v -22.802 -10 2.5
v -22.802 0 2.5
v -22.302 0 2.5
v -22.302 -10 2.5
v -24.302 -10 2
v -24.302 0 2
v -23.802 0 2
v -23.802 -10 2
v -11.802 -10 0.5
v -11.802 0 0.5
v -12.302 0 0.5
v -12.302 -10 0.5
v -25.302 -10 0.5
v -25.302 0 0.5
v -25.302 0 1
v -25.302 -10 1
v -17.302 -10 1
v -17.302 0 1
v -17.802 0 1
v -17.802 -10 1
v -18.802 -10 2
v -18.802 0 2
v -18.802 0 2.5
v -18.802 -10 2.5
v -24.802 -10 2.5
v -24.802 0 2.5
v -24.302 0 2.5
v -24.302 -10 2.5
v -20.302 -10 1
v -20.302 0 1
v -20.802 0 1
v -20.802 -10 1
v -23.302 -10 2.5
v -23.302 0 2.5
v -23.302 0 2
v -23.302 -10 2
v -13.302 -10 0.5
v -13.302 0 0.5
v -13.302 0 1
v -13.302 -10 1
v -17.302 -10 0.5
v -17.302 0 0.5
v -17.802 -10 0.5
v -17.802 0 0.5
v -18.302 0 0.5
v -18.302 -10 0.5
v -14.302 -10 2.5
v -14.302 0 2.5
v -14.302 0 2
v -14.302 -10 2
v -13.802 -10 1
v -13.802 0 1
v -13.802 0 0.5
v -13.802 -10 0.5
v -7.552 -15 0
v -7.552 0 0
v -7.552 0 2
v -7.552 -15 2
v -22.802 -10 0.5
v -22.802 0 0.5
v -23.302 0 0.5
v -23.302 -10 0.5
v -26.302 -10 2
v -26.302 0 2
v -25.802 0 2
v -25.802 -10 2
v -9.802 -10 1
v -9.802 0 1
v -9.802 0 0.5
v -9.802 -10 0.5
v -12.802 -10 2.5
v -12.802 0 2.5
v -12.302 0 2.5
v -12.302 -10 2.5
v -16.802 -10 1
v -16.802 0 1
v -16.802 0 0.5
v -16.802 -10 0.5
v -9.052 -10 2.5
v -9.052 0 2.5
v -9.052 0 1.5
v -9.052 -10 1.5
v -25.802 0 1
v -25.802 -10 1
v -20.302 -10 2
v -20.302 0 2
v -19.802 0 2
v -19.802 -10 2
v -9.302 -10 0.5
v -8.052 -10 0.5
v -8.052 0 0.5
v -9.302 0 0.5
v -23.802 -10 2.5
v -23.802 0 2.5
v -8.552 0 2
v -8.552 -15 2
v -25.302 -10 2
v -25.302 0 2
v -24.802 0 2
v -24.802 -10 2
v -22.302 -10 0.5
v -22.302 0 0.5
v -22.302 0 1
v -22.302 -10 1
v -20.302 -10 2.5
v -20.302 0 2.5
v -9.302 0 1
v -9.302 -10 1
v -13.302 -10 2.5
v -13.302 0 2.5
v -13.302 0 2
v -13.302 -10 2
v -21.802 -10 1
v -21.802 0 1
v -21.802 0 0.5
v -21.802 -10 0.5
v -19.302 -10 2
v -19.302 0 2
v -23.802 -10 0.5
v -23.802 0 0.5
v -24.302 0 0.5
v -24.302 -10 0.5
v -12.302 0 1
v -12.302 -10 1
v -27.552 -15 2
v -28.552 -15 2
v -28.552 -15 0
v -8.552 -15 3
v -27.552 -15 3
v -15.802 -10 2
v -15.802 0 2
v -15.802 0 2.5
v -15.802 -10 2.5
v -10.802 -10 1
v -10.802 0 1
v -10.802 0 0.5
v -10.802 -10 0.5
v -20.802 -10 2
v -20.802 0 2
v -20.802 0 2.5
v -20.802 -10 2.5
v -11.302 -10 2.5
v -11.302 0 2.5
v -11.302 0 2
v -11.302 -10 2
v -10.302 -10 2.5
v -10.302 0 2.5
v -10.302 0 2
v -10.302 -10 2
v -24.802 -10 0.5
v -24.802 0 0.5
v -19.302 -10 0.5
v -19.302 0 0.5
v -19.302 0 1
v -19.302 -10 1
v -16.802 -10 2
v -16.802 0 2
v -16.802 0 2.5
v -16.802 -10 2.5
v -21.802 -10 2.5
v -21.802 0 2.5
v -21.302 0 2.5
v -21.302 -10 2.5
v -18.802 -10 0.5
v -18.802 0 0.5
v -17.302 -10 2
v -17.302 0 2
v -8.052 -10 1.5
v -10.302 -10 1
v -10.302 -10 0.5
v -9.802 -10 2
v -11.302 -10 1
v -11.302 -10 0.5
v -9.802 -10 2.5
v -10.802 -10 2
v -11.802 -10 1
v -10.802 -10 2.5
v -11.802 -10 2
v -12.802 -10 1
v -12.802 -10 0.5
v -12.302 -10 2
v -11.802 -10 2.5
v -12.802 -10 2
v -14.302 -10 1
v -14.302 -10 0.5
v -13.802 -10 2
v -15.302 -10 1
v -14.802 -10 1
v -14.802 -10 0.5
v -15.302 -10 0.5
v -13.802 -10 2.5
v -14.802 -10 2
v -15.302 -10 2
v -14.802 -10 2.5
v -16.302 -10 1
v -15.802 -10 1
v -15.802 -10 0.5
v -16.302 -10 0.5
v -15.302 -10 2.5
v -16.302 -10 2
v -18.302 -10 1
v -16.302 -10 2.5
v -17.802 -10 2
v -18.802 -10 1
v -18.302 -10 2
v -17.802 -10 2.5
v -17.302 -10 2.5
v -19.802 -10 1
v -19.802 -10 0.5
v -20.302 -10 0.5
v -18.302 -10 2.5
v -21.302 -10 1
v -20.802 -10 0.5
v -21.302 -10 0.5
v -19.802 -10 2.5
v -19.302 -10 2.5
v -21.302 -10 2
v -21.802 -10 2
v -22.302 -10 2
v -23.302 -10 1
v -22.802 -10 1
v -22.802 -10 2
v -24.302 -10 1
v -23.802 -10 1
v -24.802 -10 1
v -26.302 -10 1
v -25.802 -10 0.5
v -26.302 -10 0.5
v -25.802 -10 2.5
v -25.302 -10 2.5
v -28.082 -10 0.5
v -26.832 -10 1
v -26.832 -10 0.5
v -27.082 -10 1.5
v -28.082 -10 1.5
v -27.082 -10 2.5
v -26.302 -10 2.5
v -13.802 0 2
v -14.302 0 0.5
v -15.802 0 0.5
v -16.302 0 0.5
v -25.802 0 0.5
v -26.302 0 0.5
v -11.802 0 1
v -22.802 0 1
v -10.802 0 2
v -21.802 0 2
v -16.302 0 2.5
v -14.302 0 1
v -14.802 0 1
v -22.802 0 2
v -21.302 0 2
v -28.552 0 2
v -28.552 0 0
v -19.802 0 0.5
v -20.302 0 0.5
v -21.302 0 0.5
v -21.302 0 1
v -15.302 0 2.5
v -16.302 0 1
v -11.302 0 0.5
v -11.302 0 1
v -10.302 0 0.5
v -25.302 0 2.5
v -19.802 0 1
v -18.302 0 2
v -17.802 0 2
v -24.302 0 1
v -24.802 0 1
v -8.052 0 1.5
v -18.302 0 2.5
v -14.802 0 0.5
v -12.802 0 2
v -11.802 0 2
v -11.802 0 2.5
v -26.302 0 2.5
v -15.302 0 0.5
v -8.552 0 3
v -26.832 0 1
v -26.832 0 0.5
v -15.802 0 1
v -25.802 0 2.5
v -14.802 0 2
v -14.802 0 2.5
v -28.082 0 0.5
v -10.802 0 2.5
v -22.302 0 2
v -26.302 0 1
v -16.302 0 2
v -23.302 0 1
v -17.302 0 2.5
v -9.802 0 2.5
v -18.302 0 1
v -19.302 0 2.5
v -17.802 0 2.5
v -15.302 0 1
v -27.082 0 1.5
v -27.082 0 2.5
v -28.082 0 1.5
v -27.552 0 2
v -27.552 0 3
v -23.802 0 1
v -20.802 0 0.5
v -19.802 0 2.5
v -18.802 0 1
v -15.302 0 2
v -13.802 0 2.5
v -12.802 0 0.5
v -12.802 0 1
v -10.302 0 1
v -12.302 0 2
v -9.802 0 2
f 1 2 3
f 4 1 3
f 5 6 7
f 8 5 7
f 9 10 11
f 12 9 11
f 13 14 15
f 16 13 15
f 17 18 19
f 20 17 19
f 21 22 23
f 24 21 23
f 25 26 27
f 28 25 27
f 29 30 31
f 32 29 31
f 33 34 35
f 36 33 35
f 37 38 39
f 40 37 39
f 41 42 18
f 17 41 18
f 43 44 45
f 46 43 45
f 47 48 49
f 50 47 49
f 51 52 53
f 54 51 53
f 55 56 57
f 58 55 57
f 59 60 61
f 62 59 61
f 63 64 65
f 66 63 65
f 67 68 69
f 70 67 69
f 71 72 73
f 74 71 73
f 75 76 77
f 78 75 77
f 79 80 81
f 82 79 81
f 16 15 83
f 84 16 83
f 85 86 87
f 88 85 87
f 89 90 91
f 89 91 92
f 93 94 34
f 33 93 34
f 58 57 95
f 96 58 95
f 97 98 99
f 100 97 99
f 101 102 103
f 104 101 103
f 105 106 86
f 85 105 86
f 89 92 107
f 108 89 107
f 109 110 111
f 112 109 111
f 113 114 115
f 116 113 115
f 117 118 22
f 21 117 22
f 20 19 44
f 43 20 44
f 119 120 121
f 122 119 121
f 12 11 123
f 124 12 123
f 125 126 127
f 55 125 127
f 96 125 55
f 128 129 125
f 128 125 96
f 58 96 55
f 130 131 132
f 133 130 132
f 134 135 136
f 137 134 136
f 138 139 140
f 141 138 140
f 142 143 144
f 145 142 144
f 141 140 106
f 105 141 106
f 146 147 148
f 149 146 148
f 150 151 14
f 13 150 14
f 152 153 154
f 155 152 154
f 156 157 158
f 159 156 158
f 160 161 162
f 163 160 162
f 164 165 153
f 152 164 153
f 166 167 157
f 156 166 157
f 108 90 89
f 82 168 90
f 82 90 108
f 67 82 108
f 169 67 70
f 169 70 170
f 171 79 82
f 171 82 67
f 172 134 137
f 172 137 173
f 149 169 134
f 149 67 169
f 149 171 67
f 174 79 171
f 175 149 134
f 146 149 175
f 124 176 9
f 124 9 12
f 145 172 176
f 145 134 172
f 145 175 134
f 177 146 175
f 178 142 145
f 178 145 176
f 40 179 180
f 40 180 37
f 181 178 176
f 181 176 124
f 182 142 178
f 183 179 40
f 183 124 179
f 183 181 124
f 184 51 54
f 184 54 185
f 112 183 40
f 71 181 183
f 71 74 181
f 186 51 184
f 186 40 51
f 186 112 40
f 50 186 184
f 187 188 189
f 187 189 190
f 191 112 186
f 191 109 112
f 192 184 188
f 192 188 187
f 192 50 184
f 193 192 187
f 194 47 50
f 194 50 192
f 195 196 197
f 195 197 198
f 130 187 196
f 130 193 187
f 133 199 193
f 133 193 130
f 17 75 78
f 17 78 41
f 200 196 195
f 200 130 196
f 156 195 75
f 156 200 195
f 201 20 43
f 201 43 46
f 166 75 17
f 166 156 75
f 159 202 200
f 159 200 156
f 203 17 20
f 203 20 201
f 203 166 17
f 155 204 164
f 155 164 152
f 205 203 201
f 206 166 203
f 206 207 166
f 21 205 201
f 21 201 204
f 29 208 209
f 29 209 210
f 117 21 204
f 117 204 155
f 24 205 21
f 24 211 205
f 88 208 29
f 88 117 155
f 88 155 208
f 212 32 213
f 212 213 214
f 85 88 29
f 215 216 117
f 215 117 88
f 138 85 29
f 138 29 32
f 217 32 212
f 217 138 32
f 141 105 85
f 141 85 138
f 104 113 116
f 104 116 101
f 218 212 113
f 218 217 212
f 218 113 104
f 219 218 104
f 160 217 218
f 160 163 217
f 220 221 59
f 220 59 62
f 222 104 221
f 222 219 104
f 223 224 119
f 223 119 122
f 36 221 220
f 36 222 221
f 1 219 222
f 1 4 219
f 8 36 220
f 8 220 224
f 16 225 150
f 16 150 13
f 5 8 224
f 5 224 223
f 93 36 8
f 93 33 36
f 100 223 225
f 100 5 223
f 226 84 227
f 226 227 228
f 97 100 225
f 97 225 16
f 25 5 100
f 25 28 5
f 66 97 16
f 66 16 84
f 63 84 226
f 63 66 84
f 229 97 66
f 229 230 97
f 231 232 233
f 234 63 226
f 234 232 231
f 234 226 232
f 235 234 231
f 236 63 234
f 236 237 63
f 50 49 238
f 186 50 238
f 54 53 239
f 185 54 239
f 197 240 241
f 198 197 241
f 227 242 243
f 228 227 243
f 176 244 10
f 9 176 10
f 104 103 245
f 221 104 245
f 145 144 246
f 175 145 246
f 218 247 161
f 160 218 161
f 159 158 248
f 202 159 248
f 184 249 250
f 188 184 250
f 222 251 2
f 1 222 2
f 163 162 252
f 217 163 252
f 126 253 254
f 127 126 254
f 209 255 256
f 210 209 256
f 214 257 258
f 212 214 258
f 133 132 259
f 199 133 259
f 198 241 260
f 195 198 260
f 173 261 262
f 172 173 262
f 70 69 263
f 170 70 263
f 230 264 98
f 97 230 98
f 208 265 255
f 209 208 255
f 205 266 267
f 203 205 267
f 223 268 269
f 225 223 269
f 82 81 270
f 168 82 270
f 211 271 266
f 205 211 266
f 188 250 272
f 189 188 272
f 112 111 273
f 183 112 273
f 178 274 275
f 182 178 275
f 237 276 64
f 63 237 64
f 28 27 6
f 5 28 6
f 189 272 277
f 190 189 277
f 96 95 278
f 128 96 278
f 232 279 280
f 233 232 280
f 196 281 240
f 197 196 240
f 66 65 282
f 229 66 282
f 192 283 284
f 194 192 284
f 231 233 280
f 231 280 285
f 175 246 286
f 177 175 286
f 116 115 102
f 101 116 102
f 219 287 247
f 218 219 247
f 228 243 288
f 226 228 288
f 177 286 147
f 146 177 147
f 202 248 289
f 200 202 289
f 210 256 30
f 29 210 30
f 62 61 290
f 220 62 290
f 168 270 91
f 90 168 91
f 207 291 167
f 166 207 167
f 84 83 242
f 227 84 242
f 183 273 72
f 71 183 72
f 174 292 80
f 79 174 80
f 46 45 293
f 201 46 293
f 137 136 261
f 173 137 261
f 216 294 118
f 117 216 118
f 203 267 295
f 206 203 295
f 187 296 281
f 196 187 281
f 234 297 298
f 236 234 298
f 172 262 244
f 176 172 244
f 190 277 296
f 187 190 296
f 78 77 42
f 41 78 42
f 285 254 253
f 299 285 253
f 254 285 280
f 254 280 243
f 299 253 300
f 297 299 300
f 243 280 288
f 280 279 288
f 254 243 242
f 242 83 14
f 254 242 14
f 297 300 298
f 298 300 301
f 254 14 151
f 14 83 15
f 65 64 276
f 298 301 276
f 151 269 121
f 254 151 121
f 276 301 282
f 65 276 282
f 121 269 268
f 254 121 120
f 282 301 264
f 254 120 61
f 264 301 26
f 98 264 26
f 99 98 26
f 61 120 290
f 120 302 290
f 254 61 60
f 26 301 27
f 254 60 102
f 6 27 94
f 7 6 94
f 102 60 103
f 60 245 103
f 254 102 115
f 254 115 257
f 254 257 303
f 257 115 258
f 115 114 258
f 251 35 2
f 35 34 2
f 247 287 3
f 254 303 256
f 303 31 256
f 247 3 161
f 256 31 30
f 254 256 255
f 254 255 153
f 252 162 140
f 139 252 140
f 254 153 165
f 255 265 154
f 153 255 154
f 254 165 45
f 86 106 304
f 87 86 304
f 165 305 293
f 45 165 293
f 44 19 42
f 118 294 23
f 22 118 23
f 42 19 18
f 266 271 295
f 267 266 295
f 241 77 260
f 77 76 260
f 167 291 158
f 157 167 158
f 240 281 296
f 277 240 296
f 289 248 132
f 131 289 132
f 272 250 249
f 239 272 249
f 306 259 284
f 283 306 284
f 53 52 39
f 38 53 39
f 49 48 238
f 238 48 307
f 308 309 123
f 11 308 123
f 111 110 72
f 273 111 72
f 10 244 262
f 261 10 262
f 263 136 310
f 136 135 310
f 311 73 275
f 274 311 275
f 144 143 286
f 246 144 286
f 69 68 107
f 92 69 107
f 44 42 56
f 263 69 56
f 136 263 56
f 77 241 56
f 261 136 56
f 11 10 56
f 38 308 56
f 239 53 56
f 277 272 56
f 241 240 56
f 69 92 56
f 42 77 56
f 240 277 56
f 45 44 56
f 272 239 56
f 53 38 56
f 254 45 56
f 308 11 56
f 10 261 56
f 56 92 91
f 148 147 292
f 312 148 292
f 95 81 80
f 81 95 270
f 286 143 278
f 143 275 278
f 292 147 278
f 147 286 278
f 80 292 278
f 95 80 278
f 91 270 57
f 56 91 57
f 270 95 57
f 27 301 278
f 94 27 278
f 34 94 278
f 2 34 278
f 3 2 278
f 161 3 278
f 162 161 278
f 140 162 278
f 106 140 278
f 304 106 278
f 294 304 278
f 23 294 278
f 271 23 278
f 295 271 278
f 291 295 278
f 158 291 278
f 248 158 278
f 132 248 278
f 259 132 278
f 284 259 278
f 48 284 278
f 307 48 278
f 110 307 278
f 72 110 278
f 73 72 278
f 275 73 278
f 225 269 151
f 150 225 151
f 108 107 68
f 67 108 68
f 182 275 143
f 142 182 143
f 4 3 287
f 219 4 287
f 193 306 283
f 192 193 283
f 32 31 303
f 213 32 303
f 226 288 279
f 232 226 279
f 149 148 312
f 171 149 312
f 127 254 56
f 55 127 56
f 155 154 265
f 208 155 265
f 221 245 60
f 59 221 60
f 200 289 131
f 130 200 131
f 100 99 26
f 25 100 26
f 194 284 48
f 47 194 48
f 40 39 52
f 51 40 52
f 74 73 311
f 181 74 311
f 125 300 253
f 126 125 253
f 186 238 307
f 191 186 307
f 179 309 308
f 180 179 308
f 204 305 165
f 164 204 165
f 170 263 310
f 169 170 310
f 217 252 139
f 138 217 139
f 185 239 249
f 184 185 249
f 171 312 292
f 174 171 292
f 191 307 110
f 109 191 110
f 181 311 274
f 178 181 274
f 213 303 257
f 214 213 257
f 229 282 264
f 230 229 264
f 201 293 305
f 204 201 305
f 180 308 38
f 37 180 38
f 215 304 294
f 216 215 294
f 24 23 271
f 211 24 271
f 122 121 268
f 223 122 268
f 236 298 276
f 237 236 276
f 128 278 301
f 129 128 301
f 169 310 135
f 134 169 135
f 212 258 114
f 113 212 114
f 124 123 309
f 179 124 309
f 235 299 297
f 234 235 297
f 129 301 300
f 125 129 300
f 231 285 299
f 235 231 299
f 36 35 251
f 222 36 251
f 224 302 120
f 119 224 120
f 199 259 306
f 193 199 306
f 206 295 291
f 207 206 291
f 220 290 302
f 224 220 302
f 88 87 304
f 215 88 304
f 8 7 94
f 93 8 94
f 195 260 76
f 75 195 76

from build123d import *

# Parameters (mm, degrees)
F1_DEPTH = 15
F3_DEPTH = 10


with BuildPart() as f1:
    # F0 (on Front) → F1 (new body)
    with BuildSketch(Plane.XZ):
        Polygon((-28.551763, 0), (-7.551763, 0), (-7.551763, 2), (-8.551763, 2), (-8.551763, 3), (-27.551763, 3), (-27.551763, 2), (-28.551763, 2), align=None)
    extrude(amount=F1_DEPTH)

    # F2 (on face) → F3 (cut)
    with BuildSketch(Plane(origin=(0, 0, 0), x_dir=(-1, 0, 0), z_dir=(0, 1, 0))):
        Polygon((8.051763, 1.5), (8.051763, 0.5), (9.301763, 0.5), (9.301763, 1), (9.801763, 1), (9.801763, 0.5), (10.301763, 0.5), (10.301763, 1), (10.801763, 1), (10.801763, 0.5), (11.301763, 0.5), (11.301763, 1), (11.801763, 1), (11.801763, 0.5), (12.301763, 0.5), (12.301763, 1), (12.801763, 1), (12.801763, 0.5), (13.301763, 0.5), (13.301763, 1), (13.801763, 1), (13.801763, 0.5), (14.301763, 0.5), (14.301763, 1), (14.801763, 1), (14.801763, 0.5), (15.301763, 0.5), (15.301763, 1), (15.801763, 1), (15.801763, 0.5), (16.301763, 0.5), (16.301763, 1), (16.801763, 1), (16.801763, 0.5), (17.301763, 0.5), (17.301763, 1), (17.801763, 1), (17.801763, 0.5), (18.301763, 0.5), (18.301763, 1), (18.801763, 1), (18.801763, 0.5), (19.301763, 0.5), (19.301763, 1), (19.801763, 1), (19.801763, 0.5), (20.301763, 0.5), (20.301763, 1), (20.801763, 1), (20.801763, 0.5), (21.301763, 0.5), (21.301763, 1), (21.801763, 1), (21.801763, 0.5), (22.301763, 0.5), (22.301763, 1), (22.801763, 1), (22.801763, 0.5), (23.301763, 0.5), (23.301763, 1), (23.801763, 1), (23.801763, 0.5), (24.301763, 0.5), (24.301763, 1), (24.801763, 1), (24.801763, 0.5), (25.301763, 0.5), (25.301763, 1), (25.801763, 1), (25.801763, 0.5), (26.301763, 0.5), (26.301763, 1), (26.831981, 1), (26.831981, 0.5), (28.081981, 0.5), (28.081981, 1.5), (27.081981, 1.5), (27.081981, 2.5), (26.301763, 2.5), (26.301763, 2), (25.801763, 2), (25.801763, 2.5), (25.301763, 2.5), (25.301763, 2), (24.801763, 2), (24.801763, 2.5), (24.301763, 2.5), (24.301763, 2), (23.801763, 2), (23.801763, 2.5), (23.301763, 2.5), (23.301763, 2), (22.801763, 2), (22.801763, 2.5), (22.301763, 2.5), (22.301763, 2), (21.801763, 2), (21.801763, 2.5), (21.301763, 2.5), (21.301763, 2), (20.801763, 2), (20.801763, 2.5), (20.301763, 2.5), (20.301763, 2), (19.801763, 2), (19.801763, 2.5), (19.301763, 2.5), (19.301763, 2), (18.801763, 2), (18.801763, 2.5), (18.301763, 2.5), (18.301763, 2), (17.801763, 2), (17.801763, 2.5), (17.301763, 2.5), (17.301763, 2), (16.801763, 2), (16.801763, 2.5), (16.301763, 2.5), (16.301763, 2), (15.801763, 2), (15.801763, 2.5), (15.301763, 2.5), (15.301763, 2), (14.801763, 2), (14.801763, 2.5), (14.301763, 2.5), (14.301763, 2), (13.801763, 2), (13.801763, 2.5), (13.301763, 2.5), (13.301763, 2), (12.801763, 2), (12.801763, 2.5), (12.301763, 2.5), (12.301763, 2), (11.801763, 2), (11.801763, 2.5), (11.301763, 2.5), (11.301763, 2), (10.801763, 2), (10.801763, 2.5), (10.301763, 2.5), (10.301763, 2), (9.801763, 2), (9.801763, 2.5), (9.051763, 2.5), (9.051763, 1.5), align=None)
    extrude(amount=-F3_DEPTH, mode=Mode.SUBTRACT)


solid = f1.part
